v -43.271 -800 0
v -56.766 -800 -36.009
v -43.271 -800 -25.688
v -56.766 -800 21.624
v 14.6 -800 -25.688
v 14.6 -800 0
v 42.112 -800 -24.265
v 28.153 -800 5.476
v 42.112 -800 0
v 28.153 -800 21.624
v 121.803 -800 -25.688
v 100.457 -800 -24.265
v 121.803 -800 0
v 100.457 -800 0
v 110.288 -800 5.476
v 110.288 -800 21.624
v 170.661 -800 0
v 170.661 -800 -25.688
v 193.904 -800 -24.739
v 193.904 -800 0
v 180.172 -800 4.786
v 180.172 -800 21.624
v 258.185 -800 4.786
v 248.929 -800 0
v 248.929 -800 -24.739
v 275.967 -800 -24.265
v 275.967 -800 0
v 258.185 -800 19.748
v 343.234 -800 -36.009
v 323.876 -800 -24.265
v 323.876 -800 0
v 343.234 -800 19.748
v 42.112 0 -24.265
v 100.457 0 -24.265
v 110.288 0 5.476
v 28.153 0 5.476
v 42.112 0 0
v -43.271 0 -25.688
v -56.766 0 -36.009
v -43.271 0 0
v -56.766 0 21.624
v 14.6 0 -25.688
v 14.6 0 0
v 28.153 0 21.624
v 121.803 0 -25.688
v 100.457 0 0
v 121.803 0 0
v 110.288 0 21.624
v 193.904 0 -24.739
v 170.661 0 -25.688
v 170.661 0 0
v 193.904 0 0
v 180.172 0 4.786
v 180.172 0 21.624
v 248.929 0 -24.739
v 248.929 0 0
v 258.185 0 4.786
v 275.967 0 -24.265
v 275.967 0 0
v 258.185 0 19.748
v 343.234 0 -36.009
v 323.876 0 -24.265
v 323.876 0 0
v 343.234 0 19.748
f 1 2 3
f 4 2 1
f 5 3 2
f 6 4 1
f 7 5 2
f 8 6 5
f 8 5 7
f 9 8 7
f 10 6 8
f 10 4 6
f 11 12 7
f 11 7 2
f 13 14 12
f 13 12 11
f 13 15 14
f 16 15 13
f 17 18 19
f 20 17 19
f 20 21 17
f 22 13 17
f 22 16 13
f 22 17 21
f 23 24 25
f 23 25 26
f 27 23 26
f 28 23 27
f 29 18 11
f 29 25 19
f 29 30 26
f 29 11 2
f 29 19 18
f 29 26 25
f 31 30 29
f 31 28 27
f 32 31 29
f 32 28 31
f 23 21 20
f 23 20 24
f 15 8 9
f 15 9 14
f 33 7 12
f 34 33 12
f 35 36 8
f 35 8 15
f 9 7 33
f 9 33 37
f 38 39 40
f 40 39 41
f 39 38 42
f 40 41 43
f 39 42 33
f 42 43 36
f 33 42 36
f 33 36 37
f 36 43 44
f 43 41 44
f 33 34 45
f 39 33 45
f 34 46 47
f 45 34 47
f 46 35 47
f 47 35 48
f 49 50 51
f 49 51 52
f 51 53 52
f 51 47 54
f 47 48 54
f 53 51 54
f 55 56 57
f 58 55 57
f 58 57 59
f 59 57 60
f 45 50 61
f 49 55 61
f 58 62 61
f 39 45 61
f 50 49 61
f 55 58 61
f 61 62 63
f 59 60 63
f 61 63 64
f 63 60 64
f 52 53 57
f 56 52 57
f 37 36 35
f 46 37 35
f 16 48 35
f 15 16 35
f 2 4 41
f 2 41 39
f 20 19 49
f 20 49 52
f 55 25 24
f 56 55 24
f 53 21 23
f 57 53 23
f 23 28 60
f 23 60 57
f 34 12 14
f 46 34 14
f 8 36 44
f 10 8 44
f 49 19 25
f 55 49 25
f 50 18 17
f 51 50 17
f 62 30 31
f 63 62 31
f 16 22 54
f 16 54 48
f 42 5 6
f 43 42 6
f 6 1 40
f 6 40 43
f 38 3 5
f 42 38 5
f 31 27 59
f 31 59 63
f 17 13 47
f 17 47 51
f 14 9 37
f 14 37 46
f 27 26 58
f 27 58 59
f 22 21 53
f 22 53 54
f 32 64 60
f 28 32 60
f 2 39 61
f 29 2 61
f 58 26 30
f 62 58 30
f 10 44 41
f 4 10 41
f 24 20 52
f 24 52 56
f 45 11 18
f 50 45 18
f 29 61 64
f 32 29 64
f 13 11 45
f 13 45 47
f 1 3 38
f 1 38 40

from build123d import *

# Parameters (mm, degrees)
F0_W     = 82.1346251114
F0_H     = 41.4849454792
F0_W_2   = 78.0127522687
F0_H_2   = 40.7947400829
F1_DEPTH = 800
F2_W     = 57.8707195818
F2_H     = 25.6879590452
F2_W_2   = 58.3450756967
F2_H_2   = 24.2649074644
F2_W_3   = 48.8580688834
F2_W_4   = 55.0246089697
F2_H_3   = 24.7392579913
F2_W_5   = 47.9093492031
F3_DEPTH = 800


with BuildPart() as f1:
    # F0 (on Front) → F1 (new body)
    with BuildSketch(Plane.XZ):
        Polygon((28.1532571296, 21.6244365409), (-56.7655850202, 21.6244365409), (-56.7655850202, -36.0090098664), (28.1532571296, -36.0090098664), (28.1532571296, 5.4759356128), align=None)
        with Locations((69.2205696853, -15.2665371268)):
            Rectangle(F0_W, F0_H)
        Polygon((110.287882241, 21.6244365409), (110.287882241, 5.4759356128), (110.287882241, -36.0090098664), (180.1719170811, -36.0090098664), (180.1719170811, 4.7857302164), (180.1719170811, 21.6244365409), align=None)
        with Locations((219.1782932154, -15.611639825)):
            Rectangle(F0_W_2, F0_H_2)
        Polygon((258.1846693497, 4.7857302164), (258.1846693497, -36.0090098664), (343.2344149798, -36.0090098664), (343.2344149798, 19.7481851938), (258.1846693497, 19.7481851938), align=None)
    extrude(amount=F1_DEPTH)

    # F2 (on face) → F3 (cut, through all)
    with BuildSketch(Plane.XZ.offset(800)):
        with Locations((-14.3353473395, -12.8439795226)):
            Rectangle(F2_W, F2_H)
        with Locations((71.2848622352, -12.1324537322)):
            Rectangle(F2_W_2, F2_H_2)
        with Locations((146.2321914732, -12.8439795226)):
            Rectangle(F2_W_3, F2_H)
        with Locations((221.4166894555, -12.3696289957)):
            Rectangle(F2_W_4, F2_H_3)
        with Locations((299.9216467142, -12.1324537322)):
            Rectangle(F2_W_5, F2_H_2)
    extrude(amount=-F3_DEPTH, mode=Mode.SUBTRACT)


solid = f1.part
